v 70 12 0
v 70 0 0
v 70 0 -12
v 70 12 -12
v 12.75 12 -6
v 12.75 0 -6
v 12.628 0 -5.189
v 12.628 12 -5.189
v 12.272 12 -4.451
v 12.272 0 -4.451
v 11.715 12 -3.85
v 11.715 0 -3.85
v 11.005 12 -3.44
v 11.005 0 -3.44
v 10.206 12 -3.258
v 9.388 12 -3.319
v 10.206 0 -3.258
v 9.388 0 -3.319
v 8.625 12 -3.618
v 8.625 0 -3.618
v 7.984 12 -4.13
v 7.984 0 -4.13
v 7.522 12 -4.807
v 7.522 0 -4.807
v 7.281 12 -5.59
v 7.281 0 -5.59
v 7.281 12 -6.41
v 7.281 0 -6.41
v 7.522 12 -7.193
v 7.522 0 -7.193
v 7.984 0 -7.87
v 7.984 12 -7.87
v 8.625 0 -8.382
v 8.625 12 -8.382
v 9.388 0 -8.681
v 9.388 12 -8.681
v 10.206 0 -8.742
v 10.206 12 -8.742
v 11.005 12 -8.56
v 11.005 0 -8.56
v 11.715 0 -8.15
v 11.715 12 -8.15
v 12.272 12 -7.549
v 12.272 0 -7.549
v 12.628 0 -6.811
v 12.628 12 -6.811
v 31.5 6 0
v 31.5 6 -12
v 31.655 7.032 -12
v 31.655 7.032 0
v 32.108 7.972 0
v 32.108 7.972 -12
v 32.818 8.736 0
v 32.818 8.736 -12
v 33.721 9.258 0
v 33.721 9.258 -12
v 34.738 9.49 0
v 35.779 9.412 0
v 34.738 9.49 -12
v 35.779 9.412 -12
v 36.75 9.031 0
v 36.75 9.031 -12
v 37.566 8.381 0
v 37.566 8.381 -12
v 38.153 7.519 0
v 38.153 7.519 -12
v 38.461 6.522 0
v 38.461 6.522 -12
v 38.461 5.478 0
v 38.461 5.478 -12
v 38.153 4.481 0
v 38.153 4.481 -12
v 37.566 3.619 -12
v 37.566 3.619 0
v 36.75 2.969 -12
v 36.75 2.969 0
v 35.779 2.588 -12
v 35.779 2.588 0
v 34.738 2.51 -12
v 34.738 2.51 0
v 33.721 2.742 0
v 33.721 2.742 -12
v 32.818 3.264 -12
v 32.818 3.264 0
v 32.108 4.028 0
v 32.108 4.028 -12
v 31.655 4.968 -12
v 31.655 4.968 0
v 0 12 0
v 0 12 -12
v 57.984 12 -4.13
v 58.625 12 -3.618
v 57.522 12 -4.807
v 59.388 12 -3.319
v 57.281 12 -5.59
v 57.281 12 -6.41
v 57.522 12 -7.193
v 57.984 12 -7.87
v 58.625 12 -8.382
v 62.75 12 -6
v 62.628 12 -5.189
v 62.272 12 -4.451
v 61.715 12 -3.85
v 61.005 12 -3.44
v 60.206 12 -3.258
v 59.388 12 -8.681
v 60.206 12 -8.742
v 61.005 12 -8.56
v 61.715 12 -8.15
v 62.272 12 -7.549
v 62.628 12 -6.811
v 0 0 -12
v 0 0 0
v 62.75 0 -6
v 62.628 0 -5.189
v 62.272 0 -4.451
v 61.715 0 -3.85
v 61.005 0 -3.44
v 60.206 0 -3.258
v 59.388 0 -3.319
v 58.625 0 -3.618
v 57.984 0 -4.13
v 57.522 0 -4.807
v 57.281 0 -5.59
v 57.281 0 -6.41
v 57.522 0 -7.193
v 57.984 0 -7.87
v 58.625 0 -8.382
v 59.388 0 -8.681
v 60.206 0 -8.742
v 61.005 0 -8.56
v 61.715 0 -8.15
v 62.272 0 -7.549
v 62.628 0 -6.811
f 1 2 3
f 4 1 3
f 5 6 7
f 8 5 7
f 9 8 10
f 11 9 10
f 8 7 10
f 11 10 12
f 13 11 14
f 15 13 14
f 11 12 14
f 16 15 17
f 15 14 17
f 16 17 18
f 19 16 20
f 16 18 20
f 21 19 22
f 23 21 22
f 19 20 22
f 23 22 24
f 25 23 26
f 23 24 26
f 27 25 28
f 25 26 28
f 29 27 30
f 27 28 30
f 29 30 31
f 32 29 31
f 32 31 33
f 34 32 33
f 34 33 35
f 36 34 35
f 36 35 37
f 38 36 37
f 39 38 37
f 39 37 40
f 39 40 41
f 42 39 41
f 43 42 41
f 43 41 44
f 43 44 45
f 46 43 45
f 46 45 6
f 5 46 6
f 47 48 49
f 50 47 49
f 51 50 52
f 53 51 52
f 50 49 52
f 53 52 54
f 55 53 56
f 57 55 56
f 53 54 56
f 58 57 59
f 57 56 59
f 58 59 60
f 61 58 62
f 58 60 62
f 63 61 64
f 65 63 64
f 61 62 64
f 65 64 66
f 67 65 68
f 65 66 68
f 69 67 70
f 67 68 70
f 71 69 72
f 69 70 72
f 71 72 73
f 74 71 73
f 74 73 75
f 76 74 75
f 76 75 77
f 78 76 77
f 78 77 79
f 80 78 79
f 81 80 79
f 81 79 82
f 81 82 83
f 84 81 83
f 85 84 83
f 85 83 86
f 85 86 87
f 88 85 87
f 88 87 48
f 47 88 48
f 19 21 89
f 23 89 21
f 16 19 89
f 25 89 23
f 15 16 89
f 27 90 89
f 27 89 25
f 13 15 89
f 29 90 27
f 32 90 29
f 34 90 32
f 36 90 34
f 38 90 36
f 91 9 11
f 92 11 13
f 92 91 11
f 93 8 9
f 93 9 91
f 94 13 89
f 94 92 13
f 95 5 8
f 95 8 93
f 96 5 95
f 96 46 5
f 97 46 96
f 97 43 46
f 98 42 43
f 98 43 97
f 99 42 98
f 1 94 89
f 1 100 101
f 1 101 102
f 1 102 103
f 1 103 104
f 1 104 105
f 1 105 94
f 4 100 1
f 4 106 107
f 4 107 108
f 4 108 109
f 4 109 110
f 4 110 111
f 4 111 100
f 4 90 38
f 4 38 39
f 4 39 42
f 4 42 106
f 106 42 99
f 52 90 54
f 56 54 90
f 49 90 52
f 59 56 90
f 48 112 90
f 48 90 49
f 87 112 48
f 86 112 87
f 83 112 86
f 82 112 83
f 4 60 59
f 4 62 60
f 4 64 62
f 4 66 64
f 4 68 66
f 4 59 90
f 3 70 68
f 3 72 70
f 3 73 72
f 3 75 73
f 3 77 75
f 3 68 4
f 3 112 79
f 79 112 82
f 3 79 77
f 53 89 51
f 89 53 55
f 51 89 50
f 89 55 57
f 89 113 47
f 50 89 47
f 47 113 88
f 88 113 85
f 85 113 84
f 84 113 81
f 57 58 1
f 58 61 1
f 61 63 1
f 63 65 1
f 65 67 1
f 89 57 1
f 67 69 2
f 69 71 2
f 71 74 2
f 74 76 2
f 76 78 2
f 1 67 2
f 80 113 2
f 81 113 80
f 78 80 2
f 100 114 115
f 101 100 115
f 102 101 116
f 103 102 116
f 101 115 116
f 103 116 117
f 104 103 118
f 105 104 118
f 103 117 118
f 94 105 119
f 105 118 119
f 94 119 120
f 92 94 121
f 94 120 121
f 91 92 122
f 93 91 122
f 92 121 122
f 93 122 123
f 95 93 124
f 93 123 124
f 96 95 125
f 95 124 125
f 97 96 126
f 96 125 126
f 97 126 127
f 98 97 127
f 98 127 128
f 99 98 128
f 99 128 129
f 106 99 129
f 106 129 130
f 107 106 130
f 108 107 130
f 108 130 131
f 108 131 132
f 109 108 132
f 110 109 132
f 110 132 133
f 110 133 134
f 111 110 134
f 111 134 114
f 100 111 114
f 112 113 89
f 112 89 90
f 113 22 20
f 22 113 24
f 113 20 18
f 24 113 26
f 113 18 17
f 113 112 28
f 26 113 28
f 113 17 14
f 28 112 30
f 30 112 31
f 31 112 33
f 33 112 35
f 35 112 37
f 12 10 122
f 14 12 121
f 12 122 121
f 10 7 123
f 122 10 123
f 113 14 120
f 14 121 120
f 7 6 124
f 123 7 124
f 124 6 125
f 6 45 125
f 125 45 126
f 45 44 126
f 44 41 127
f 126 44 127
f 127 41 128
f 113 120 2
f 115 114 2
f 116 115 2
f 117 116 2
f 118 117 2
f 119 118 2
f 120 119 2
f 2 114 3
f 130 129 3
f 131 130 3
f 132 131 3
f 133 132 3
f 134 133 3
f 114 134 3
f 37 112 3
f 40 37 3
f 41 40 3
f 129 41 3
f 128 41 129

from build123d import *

# Parameters (mm, degrees)
SKETCH1_W                  = 70
SKETCH1_H                  = 12
BOSS_EXTRUDE1_DEPTH        = 12
M8X1_0_TAPPED_HOLE1_D      = 7
F_5_5_5_5_DIAMETER_HOLE1_D = 5.5


with BuildPart() as part:
    # Sketch1 → Boss-Extrude1 (new body)
    with BuildSketch(Plane(origin=(0, 0, 0), x_dir=(1, 0, 0), z_dir=(0, 1, 0))):
        with Locations((35, 6)):
            Rectangle(SKETCH1_W, SKETCH1_H)
    extrude(amount=BOSS_EXTRUDE1_DEPTH)

    # M8x1.0 Tapped Hole1 (through all)
    with Locations(Plane.XY):
        with Locations((35, 6)):
            Hole(M8X1_0_TAPPED_HOLE1_D / 2)

    # Ø5.5 (5.5) Diameter Hole1 (through all)
    with Locations(Plane(origin=(0, 12, 0), x_dir=(-1, 0, 0), z_dir=(0, 1, 0))):
        with Locations((-10, -6), (-60, -6)):
            Hole(F_5_5_5_5_DIAMETER_HOLE1_D / 2)


solid = part.part
